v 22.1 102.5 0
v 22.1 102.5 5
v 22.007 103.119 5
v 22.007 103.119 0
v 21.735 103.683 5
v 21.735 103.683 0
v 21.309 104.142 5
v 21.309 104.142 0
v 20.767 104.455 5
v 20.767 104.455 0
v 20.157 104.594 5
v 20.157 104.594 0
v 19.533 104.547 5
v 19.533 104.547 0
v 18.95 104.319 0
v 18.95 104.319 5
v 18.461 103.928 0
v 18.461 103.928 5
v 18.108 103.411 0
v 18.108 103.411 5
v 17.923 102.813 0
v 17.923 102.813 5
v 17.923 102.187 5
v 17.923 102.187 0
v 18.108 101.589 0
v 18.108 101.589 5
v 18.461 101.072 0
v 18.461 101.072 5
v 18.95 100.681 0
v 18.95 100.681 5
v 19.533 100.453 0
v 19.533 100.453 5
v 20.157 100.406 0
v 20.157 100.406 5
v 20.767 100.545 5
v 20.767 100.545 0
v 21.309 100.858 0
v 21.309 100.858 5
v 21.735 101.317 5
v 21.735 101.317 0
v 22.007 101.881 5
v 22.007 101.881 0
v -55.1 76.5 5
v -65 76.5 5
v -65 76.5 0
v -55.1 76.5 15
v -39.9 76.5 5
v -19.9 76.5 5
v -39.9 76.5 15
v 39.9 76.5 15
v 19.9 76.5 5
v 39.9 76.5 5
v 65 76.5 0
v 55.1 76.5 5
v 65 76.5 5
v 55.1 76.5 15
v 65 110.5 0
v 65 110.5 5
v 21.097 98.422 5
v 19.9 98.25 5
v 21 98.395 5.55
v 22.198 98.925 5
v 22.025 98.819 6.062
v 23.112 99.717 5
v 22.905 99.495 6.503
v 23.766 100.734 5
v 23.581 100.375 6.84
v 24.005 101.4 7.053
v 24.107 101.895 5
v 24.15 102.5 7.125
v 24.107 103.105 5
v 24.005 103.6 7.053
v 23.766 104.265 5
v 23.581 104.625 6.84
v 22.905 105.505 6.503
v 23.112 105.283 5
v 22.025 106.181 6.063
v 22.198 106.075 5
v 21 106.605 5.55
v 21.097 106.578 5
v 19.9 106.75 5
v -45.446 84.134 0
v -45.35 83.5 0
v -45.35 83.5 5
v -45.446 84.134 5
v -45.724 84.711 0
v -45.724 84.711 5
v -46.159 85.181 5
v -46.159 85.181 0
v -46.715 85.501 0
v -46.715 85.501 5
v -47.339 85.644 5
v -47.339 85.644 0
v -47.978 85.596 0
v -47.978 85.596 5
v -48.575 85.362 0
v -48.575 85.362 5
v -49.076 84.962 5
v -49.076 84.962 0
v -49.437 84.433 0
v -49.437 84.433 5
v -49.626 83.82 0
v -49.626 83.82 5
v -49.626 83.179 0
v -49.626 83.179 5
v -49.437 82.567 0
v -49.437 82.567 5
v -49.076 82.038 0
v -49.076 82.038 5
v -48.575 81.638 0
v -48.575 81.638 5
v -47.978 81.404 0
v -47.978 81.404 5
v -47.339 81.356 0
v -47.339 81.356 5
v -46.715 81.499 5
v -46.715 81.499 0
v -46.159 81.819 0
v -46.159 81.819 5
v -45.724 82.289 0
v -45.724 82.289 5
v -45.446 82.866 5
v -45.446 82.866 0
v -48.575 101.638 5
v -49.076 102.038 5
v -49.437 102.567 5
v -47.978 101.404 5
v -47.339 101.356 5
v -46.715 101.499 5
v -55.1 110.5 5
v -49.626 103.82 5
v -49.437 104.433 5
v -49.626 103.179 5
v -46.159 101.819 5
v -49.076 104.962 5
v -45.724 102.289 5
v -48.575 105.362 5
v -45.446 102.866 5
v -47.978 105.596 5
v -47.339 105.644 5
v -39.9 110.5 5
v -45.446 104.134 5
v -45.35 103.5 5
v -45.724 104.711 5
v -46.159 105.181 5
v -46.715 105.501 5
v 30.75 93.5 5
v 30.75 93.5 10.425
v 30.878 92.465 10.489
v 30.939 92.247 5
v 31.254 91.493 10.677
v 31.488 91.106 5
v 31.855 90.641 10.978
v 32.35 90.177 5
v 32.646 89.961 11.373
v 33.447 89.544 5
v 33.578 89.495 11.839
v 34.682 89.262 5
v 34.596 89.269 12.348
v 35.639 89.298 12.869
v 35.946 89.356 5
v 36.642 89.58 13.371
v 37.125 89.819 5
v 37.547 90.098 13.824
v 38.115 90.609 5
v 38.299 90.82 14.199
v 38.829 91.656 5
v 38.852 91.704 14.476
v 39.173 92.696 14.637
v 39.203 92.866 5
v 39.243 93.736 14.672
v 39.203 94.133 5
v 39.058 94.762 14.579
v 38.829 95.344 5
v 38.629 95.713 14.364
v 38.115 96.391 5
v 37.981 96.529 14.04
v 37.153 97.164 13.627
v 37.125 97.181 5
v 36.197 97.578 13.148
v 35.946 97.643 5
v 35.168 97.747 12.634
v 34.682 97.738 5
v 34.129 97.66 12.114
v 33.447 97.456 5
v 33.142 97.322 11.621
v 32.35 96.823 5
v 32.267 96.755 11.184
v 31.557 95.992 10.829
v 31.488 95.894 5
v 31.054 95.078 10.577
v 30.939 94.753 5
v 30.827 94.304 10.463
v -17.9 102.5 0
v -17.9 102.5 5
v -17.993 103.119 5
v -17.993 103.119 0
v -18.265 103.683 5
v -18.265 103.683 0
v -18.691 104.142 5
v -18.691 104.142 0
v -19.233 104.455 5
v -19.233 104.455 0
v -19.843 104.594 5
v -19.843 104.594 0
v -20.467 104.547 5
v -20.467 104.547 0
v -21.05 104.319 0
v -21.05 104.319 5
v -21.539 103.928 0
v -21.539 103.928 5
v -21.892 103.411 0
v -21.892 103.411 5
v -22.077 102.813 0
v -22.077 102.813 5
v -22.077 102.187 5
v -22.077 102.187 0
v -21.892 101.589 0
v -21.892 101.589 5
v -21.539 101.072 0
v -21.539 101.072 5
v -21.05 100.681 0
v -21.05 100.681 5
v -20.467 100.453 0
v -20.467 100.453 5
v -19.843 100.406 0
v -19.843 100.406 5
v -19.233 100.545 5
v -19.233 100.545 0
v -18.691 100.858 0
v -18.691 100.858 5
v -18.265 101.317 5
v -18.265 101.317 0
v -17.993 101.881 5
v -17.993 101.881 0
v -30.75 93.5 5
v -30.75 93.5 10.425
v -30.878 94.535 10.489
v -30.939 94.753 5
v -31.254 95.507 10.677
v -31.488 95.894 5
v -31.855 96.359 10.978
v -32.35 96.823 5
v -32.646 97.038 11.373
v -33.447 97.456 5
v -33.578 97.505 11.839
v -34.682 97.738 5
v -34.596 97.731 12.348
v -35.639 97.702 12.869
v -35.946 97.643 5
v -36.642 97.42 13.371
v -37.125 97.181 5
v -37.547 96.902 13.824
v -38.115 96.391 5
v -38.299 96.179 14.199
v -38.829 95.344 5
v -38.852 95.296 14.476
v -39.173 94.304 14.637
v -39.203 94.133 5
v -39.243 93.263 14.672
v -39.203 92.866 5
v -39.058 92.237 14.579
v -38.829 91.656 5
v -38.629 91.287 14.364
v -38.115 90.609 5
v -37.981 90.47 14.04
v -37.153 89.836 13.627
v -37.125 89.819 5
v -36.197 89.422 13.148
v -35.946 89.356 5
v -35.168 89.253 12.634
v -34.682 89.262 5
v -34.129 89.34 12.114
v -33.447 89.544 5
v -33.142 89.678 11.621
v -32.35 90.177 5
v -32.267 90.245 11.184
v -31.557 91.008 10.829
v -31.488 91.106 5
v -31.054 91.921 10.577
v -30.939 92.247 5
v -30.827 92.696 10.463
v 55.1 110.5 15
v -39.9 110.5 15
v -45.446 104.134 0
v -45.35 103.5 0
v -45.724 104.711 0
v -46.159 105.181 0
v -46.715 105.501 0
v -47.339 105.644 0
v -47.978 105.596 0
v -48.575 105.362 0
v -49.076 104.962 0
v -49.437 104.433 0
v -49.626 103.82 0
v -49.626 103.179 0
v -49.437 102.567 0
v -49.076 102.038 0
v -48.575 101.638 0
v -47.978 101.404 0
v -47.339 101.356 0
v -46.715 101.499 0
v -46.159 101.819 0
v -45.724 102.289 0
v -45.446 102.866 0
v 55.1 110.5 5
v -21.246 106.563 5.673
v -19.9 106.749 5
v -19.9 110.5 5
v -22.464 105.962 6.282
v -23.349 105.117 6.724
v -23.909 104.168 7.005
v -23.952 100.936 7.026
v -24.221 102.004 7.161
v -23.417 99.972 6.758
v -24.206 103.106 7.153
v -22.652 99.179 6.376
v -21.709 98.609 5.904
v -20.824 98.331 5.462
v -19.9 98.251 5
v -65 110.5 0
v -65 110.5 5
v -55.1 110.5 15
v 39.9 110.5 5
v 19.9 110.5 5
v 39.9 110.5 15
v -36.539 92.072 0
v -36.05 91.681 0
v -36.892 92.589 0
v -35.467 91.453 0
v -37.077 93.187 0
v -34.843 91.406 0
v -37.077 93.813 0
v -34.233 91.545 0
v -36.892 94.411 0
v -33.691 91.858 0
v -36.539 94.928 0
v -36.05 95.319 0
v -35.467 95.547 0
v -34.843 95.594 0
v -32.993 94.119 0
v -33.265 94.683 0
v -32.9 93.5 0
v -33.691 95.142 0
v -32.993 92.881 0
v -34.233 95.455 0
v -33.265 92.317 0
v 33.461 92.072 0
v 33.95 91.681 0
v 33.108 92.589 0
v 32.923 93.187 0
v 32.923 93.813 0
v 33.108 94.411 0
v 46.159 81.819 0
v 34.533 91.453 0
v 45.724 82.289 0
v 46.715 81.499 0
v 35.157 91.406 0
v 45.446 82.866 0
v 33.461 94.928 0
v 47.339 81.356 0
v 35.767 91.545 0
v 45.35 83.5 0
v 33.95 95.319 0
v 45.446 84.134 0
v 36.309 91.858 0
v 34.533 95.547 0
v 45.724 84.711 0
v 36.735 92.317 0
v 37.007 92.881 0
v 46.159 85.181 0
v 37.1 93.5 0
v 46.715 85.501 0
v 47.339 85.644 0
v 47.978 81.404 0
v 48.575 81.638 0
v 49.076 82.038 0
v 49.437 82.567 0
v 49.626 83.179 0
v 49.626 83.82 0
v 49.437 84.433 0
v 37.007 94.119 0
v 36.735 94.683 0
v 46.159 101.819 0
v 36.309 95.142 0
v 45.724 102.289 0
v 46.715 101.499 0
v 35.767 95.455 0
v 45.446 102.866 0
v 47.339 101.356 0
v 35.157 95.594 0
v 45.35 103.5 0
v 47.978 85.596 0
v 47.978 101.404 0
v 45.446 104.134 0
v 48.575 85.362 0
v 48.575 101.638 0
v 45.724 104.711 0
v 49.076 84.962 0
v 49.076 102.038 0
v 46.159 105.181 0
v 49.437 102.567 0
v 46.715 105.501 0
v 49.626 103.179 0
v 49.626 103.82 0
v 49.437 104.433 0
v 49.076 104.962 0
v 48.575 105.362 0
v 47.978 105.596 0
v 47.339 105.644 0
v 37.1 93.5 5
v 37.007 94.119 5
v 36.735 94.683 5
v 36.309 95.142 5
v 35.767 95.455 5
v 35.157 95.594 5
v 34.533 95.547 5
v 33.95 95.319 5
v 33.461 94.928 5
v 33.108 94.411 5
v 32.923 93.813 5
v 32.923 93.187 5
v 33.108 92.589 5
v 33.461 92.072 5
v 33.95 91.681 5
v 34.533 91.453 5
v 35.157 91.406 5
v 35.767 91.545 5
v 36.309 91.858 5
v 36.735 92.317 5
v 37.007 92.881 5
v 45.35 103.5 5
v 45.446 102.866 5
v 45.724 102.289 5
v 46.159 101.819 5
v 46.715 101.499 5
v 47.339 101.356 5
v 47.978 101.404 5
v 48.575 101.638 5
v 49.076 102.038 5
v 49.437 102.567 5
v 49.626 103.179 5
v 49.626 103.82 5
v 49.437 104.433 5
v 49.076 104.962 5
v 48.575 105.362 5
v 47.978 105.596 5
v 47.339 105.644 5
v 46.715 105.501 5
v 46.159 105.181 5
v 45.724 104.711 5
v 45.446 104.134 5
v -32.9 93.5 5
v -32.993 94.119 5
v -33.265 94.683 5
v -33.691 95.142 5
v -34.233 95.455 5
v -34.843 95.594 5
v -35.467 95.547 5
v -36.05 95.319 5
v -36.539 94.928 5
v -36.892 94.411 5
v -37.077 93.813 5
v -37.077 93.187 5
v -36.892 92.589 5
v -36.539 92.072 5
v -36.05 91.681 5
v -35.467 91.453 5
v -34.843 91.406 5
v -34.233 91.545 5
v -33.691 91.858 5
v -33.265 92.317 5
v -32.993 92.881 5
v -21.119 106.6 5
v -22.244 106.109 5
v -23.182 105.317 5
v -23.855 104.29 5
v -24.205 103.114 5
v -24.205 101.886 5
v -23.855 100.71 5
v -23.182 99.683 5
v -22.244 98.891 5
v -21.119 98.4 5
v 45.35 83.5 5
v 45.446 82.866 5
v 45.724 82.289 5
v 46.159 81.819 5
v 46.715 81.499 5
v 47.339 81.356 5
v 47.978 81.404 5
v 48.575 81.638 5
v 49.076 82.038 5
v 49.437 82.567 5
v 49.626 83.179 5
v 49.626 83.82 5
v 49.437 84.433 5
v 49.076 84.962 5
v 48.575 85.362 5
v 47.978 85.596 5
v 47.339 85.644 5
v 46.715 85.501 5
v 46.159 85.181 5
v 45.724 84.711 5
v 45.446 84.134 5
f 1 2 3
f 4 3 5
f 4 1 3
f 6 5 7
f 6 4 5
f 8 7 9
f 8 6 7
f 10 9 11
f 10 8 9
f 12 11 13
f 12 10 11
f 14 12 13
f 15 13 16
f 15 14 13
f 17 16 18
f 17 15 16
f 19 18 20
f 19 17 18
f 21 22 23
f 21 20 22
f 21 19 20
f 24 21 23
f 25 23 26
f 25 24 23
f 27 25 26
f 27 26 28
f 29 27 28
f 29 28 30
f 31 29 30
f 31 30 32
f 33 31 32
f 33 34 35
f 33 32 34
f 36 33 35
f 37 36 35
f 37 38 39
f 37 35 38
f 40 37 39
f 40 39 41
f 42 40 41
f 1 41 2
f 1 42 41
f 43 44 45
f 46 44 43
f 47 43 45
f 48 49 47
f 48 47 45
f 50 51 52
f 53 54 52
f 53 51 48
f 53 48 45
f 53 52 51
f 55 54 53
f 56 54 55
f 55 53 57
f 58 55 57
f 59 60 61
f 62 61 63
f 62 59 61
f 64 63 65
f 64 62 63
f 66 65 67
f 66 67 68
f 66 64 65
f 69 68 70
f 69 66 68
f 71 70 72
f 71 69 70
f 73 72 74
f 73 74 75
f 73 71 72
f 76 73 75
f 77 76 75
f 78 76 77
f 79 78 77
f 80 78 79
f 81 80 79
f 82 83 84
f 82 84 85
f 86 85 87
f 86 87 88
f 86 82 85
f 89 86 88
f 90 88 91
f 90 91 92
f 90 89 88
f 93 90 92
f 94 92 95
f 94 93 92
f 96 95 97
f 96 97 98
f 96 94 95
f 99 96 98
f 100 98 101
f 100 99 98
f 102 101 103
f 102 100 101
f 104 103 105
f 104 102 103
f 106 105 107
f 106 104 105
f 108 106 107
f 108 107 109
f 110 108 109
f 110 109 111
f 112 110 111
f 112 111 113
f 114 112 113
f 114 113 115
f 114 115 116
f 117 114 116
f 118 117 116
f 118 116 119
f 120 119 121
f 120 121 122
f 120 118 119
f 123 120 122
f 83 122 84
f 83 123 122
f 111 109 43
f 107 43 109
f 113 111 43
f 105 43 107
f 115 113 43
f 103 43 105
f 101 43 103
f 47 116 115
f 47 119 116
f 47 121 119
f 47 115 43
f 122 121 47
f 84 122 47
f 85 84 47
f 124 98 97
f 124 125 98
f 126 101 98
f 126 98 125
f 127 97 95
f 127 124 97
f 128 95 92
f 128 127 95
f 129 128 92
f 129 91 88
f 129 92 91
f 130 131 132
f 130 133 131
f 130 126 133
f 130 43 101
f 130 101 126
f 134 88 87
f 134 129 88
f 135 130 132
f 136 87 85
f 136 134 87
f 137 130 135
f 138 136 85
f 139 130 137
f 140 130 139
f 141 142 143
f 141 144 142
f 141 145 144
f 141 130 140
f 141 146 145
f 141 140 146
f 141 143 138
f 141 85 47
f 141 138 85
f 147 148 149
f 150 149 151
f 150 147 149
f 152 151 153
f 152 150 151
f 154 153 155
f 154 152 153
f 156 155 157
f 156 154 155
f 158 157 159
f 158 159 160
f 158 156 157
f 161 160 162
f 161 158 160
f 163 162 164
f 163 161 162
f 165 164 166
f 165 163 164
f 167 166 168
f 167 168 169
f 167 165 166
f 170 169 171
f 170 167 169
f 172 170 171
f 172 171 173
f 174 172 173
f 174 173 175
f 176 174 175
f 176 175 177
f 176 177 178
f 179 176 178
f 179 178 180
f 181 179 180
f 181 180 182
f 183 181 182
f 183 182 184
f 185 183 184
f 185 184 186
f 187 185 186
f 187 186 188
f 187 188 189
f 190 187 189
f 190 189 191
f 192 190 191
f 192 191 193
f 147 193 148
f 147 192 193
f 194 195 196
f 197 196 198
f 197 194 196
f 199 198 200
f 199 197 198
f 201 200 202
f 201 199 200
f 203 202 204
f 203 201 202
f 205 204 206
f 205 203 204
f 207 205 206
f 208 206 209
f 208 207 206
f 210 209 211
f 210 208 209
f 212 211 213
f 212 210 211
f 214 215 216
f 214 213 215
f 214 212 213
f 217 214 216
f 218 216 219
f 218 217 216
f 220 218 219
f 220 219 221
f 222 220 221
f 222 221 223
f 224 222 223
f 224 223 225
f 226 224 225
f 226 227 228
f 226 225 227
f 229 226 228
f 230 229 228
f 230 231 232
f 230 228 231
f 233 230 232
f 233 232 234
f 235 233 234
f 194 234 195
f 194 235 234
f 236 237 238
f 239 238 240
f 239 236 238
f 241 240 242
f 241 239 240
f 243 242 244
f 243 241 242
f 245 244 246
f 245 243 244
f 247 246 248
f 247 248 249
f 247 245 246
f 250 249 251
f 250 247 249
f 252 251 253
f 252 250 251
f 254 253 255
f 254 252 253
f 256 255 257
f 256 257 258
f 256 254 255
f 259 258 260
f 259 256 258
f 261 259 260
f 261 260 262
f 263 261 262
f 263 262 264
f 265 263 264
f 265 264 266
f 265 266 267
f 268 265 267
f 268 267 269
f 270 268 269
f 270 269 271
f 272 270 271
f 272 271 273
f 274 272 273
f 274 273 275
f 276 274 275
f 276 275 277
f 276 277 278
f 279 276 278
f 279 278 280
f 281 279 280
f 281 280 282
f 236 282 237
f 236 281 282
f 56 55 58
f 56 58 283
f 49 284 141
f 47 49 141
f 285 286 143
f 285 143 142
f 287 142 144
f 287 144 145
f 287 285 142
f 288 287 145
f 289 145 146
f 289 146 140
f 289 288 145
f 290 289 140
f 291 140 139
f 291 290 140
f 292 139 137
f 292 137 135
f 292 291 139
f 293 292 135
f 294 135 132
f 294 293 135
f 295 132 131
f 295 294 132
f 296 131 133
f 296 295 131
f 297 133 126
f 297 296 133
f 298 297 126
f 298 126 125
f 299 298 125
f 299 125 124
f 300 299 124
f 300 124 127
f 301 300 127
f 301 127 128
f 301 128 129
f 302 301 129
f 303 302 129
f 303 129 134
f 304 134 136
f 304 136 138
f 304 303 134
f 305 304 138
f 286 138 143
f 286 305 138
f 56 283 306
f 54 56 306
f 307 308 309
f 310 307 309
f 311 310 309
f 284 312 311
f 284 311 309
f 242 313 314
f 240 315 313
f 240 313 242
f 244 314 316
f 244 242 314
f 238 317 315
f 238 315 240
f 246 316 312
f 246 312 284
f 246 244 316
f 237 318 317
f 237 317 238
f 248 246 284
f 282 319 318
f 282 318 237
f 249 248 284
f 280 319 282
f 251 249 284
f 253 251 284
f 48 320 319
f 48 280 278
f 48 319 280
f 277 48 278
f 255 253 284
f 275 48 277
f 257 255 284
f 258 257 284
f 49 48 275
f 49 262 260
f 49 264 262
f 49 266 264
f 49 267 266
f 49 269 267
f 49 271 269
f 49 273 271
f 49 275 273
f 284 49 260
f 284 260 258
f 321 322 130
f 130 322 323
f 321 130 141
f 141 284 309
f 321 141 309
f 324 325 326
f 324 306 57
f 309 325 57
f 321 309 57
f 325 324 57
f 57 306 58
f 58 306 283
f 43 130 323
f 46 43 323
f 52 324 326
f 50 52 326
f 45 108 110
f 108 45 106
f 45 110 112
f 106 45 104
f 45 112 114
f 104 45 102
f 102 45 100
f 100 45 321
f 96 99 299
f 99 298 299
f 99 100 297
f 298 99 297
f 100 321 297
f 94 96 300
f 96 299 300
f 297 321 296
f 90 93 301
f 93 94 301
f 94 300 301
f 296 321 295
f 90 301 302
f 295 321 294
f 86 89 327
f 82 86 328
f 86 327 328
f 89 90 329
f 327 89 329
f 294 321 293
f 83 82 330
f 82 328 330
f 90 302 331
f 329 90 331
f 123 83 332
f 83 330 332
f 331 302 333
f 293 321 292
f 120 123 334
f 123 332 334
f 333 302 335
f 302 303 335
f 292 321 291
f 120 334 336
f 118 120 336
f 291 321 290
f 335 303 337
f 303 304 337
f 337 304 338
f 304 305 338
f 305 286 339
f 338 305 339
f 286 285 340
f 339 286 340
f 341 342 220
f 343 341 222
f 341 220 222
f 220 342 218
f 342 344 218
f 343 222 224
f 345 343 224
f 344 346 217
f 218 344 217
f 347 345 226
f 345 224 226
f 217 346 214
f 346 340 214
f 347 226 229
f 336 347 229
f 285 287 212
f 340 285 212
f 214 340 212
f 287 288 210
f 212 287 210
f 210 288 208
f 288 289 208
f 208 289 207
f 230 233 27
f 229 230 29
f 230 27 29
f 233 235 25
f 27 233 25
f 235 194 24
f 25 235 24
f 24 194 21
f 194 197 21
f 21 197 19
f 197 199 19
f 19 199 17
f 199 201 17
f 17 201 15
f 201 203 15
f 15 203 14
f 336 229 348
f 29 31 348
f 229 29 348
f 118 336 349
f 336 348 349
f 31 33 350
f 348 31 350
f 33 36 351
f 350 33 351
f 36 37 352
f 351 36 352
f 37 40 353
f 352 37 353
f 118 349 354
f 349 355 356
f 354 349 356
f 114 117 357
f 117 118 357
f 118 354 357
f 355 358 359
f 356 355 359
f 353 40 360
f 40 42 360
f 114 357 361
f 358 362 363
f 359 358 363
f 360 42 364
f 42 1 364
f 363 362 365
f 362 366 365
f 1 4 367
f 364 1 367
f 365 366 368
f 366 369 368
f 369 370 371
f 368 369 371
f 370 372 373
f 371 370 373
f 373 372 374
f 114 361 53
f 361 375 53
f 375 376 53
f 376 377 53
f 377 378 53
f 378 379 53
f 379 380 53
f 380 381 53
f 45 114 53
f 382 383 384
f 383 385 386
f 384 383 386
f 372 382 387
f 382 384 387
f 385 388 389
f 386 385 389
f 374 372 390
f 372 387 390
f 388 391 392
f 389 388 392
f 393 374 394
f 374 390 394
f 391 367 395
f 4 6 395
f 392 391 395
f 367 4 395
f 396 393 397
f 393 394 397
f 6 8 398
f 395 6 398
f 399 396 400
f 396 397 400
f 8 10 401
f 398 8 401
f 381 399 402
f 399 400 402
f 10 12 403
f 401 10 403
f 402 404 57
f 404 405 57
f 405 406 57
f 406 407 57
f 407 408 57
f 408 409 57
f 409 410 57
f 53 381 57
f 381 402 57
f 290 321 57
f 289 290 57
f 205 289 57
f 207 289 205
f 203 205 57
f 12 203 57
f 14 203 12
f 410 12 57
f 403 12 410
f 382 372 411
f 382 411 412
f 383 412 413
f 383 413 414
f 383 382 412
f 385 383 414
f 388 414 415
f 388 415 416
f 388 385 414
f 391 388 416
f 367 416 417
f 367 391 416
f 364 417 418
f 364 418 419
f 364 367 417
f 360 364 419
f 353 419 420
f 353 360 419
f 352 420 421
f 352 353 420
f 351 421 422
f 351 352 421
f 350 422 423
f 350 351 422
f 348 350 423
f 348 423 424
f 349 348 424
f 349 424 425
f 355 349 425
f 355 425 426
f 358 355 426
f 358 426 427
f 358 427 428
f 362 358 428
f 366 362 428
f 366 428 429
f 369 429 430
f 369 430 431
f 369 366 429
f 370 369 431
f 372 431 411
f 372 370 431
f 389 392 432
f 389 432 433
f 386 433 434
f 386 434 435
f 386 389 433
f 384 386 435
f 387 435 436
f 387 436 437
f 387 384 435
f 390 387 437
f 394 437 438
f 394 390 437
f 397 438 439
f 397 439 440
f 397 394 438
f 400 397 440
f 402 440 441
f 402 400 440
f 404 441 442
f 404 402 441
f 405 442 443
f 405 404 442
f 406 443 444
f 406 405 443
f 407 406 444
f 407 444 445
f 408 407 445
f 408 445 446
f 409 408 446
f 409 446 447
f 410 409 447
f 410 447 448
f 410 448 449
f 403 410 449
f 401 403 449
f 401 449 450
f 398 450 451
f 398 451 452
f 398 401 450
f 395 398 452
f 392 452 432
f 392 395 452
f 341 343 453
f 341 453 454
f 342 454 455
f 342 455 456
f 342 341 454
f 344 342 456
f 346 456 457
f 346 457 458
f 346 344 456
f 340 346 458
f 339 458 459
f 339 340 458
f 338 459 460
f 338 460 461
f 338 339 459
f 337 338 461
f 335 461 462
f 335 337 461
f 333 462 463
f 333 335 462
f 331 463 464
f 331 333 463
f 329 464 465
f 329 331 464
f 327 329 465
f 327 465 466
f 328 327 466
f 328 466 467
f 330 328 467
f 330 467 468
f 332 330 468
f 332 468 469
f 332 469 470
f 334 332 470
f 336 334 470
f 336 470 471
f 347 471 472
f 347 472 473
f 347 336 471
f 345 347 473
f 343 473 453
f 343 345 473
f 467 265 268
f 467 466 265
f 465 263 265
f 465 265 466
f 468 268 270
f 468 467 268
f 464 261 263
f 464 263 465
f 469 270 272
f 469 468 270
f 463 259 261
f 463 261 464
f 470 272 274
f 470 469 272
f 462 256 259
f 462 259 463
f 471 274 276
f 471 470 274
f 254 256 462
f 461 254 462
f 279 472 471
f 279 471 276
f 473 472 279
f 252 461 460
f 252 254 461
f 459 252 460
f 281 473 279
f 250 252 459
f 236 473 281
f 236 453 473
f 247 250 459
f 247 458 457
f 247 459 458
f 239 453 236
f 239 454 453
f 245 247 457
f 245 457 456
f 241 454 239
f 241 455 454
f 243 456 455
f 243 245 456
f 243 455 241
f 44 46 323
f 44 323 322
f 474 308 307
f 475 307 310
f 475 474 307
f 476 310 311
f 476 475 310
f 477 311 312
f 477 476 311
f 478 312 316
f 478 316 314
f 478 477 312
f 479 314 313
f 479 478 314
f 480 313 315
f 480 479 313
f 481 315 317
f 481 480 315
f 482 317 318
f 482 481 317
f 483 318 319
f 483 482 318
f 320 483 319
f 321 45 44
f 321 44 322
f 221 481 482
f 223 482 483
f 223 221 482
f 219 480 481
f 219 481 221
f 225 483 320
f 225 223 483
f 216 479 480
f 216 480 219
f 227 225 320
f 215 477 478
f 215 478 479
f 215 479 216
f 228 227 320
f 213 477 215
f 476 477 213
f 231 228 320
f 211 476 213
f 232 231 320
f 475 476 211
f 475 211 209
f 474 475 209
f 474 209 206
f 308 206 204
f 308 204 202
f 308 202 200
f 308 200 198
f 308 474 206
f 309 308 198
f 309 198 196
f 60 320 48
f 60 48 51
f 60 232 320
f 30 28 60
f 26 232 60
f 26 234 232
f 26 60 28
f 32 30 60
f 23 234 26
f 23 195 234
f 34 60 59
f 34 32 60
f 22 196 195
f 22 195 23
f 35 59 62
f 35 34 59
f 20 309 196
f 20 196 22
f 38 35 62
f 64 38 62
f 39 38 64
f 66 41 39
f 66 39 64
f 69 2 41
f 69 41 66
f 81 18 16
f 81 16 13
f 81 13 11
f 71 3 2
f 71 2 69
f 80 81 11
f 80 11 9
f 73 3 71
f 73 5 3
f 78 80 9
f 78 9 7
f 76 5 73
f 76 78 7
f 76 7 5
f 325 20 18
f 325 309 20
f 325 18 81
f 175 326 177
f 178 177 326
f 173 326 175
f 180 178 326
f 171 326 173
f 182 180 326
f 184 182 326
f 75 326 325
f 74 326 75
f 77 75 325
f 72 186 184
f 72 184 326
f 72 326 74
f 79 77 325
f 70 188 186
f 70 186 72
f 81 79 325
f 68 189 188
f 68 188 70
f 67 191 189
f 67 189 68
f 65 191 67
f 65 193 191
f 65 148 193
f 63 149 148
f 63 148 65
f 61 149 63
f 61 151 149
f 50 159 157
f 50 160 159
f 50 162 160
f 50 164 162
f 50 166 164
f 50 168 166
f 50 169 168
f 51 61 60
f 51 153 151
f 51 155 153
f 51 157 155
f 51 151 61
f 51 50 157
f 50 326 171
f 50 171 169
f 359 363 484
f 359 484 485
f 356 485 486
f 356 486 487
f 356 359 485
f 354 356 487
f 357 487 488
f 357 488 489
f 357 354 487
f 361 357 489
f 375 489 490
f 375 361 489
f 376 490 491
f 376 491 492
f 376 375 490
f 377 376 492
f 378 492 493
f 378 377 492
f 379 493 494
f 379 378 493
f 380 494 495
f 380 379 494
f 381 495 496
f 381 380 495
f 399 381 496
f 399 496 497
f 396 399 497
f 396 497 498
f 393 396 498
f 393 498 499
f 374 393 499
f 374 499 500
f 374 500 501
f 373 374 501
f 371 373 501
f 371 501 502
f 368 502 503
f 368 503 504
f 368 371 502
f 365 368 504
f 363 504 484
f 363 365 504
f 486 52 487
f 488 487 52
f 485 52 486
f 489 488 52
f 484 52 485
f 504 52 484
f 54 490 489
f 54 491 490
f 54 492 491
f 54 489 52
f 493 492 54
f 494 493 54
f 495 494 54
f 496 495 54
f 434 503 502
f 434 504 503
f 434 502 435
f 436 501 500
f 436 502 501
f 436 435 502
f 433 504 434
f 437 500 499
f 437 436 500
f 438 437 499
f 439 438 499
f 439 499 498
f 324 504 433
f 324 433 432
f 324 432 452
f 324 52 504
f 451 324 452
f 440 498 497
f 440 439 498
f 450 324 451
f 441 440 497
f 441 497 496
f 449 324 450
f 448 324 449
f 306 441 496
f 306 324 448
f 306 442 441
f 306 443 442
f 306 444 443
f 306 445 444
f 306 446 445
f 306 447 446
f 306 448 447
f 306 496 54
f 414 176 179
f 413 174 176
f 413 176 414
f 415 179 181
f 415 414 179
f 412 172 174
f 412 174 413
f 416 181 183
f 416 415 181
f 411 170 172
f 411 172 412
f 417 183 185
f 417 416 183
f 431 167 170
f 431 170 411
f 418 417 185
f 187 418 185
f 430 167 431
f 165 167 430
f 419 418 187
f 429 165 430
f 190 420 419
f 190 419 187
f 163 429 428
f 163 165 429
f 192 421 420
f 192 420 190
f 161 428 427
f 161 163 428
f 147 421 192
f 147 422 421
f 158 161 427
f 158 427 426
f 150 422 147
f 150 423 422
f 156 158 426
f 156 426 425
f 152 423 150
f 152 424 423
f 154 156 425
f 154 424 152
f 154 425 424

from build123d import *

# Parameters (mm, degrees)
SKETCH1_W          = 130
SKETCH1_H          = 34
SKETCH1_R          = 2.1
SKETCH1_R_2        = 2.15
EXTRUDE1_DEPTH     = 5
EXTRUDE2_DEPTH     = 34
SKETCH4_R          = 4.25
CUT_EXTRUDE1_DEPTH = 34


with BuildPart() as part:
    # Sketch1 → Extrude1 (new body)
    with BuildSketch(Plane.XY):
        with Locations((0, 93.499923245)):
            Rectangle(SKETCH1_W, SKETCH1_H)
        with Locations((35, 93.499923245)):
            Circle(SKETCH1_R, mode=Mode.SUBTRACT)
        with Locations((20, 102.499923245)):
            Circle(SKETCH1_R, mode=Mode.SUBTRACT)
        with Locations((-35, 93.499923245)):
            Circle(SKETCH1_R, mode=Mode.SUBTRACT)
        with Locations((-20, 102.499923245)):
            Circle(SKETCH1_R, mode=Mode.SUBTRACT)
        with Locations((-47.5, 103.499923245)):
            Circle(SKETCH1_R_2, mode=Mode.SUBTRACT)
        with Locations((-47.5, 83.499923245)):
            Circle(SKETCH1_R_2, mode=Mode.SUBTRACT)
        with Locations(Location((47.5, 83.499923245, 0), (0, 0, 180))):
            Circle(SKETCH1_R_2, mode=Mode.SUBTRACT)
        with Locations(Location((47.5, 103.499923245, 0), (0, 0, 180))):
            Circle(SKETCH1_R_2, mode=Mode.SUBTRACT)
    extrude(amount=EXTRUDE1_DEPTH)

    # Sketch3 → Extrude2 (add)
    with BuildSketch(Plane.XZ.offset(-76.499923245)):
        Polygon((-65, 5), (-55.1, 5), (-55.1, 15), align=None)
        Polygon((-39.9, 5), (-19.9, 5), (-39.9, 15), align=None)
        Polygon((39.9, 15), (19.9, 5), (39.9, 5), align=None)
        Polygon((65, 5), (55.1, 15), (55.1, 5), align=None)
    extrude(amount=-EXTRUDE2_DEPTH)

    # Sketch4 → Cut-Extrude1 (cut)
    with BuildSketch(Plane.XY.offset(5)):
        with Locations((-20, 102.499923245)):
            Circle(SKETCH4_R)
        with Locations((19.9, 102.499923245)):
            Circle(SKETCH4_R)
        with Locations((-35, 93.499923245)):
            Circle(SKETCH4_R)
        with Locations(Location((35, 93.499923245, 0), (0, 0, 180))):
            Circle(SKETCH4_R)
    extrude(amount=CUT_EXTRUDE1_DEPTH, mode=Mode.SUBTRACT)


solid = part.part
